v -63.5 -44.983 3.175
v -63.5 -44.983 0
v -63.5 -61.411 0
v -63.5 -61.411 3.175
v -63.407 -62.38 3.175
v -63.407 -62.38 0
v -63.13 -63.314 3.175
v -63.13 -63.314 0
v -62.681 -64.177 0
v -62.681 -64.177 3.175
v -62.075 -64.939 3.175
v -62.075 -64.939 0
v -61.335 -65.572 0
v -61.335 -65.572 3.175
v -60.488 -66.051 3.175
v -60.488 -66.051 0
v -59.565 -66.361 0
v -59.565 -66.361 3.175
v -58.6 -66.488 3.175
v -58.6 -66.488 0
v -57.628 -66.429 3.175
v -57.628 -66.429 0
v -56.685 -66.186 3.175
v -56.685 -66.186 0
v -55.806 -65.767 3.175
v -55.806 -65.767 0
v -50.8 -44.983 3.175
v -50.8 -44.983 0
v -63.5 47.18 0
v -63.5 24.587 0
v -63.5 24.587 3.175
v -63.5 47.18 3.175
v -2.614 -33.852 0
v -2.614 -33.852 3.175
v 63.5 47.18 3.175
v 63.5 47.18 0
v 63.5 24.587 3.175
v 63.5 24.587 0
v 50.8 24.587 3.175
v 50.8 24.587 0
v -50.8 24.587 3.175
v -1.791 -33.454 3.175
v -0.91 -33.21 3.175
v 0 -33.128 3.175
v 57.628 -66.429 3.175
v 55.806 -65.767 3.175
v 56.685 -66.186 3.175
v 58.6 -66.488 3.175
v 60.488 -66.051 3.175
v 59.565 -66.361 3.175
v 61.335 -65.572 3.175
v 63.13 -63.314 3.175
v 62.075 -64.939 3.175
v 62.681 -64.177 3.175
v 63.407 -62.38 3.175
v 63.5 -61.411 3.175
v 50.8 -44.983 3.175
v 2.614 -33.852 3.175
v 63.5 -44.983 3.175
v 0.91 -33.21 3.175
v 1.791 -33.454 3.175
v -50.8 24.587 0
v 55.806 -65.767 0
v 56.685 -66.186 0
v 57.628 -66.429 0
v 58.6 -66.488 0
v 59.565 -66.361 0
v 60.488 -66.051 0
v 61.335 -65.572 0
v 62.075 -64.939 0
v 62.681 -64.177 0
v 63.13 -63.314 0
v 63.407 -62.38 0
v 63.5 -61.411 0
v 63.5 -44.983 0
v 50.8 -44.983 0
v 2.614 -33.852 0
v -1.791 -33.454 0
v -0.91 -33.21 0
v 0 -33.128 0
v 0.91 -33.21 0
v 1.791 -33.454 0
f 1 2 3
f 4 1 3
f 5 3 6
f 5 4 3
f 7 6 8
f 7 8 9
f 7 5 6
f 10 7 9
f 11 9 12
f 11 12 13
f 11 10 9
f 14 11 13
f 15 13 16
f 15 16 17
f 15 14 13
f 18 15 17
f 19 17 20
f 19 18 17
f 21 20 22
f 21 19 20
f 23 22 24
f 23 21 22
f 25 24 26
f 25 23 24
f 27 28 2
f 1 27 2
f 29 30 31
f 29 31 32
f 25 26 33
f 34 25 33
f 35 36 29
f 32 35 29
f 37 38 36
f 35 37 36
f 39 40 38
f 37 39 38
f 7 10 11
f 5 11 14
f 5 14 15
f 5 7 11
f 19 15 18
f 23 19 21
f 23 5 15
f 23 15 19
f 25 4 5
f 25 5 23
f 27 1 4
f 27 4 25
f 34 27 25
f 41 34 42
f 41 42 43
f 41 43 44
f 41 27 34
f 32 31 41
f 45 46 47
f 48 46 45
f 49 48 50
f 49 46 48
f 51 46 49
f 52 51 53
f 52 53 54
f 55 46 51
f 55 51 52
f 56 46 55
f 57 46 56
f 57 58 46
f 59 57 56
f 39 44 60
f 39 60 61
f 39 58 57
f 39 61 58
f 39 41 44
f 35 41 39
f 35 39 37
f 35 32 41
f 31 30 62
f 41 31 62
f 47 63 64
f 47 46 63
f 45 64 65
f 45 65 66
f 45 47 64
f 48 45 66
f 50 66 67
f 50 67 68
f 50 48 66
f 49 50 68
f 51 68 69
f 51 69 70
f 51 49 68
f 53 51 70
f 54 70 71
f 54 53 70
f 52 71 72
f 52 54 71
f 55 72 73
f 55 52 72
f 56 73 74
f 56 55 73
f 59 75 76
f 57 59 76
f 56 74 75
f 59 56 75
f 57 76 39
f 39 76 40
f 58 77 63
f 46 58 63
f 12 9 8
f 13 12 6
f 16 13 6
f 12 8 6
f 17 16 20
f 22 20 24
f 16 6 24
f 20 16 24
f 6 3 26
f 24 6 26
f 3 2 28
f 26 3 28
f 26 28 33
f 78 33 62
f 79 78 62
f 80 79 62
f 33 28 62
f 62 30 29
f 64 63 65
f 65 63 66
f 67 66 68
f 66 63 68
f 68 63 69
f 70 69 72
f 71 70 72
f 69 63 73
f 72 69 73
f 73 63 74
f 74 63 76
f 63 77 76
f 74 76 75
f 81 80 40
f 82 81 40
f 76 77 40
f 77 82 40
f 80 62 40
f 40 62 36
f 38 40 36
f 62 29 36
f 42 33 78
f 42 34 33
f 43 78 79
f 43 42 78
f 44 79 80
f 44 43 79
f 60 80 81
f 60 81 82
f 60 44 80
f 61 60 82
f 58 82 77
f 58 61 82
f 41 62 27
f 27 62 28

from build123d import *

# Parameters (mm, degrees)
F0_W     = 12.7
F0_H     = 22.5932470911
F1_DEPTH = 3.175
F2_R     = 5.08


# Not quite as in the source:
# - two fillets or chamfers of one size are made in one step
# - a feature names something its author has since deleted; it is built from what else it names


with BuildPart() as f1:
    # F0 (on Top) → F1 (new body)
    with BuildSketch(Plane.XY):
        Polygon((-50.8, 47.1803817213), (-50.8, 24.5871346301), (-50.8, -32.2834653699), (-50.8, -44.9834653699), (-63.5, -44.9834653699), (-63.5, -70.3834653699), (0, -32.2834653699), (63.5, -70.3834653699), (63.5, -44.9834653699), (50.8, -44.9834653699), (50.8, -32.2834653699), (50.8, 24.5871346301), (50.8, 47.1803817213), (0, 47.1803817213), align=None)
        with Locations((-57.15, 35.8837581757)):
            Rectangle(F0_W, F0_H)
        with Locations((57.15, 35.8837581757)):
            Rectangle(F0_W, F0_H)
    extrude(amount=F1_DEPTH)

    # F2
    f2_edges = [f1.edges().sort_by_distance(p)[0] for p in [
        (-63.5, -70.383465, 1.5875),
        (0, -32.283465, 1.5875),
        (63.5, -70.383465, 1.5875),
    ]]
    fillet(f2_edges, radius=F2_R)


solid = f1.part
